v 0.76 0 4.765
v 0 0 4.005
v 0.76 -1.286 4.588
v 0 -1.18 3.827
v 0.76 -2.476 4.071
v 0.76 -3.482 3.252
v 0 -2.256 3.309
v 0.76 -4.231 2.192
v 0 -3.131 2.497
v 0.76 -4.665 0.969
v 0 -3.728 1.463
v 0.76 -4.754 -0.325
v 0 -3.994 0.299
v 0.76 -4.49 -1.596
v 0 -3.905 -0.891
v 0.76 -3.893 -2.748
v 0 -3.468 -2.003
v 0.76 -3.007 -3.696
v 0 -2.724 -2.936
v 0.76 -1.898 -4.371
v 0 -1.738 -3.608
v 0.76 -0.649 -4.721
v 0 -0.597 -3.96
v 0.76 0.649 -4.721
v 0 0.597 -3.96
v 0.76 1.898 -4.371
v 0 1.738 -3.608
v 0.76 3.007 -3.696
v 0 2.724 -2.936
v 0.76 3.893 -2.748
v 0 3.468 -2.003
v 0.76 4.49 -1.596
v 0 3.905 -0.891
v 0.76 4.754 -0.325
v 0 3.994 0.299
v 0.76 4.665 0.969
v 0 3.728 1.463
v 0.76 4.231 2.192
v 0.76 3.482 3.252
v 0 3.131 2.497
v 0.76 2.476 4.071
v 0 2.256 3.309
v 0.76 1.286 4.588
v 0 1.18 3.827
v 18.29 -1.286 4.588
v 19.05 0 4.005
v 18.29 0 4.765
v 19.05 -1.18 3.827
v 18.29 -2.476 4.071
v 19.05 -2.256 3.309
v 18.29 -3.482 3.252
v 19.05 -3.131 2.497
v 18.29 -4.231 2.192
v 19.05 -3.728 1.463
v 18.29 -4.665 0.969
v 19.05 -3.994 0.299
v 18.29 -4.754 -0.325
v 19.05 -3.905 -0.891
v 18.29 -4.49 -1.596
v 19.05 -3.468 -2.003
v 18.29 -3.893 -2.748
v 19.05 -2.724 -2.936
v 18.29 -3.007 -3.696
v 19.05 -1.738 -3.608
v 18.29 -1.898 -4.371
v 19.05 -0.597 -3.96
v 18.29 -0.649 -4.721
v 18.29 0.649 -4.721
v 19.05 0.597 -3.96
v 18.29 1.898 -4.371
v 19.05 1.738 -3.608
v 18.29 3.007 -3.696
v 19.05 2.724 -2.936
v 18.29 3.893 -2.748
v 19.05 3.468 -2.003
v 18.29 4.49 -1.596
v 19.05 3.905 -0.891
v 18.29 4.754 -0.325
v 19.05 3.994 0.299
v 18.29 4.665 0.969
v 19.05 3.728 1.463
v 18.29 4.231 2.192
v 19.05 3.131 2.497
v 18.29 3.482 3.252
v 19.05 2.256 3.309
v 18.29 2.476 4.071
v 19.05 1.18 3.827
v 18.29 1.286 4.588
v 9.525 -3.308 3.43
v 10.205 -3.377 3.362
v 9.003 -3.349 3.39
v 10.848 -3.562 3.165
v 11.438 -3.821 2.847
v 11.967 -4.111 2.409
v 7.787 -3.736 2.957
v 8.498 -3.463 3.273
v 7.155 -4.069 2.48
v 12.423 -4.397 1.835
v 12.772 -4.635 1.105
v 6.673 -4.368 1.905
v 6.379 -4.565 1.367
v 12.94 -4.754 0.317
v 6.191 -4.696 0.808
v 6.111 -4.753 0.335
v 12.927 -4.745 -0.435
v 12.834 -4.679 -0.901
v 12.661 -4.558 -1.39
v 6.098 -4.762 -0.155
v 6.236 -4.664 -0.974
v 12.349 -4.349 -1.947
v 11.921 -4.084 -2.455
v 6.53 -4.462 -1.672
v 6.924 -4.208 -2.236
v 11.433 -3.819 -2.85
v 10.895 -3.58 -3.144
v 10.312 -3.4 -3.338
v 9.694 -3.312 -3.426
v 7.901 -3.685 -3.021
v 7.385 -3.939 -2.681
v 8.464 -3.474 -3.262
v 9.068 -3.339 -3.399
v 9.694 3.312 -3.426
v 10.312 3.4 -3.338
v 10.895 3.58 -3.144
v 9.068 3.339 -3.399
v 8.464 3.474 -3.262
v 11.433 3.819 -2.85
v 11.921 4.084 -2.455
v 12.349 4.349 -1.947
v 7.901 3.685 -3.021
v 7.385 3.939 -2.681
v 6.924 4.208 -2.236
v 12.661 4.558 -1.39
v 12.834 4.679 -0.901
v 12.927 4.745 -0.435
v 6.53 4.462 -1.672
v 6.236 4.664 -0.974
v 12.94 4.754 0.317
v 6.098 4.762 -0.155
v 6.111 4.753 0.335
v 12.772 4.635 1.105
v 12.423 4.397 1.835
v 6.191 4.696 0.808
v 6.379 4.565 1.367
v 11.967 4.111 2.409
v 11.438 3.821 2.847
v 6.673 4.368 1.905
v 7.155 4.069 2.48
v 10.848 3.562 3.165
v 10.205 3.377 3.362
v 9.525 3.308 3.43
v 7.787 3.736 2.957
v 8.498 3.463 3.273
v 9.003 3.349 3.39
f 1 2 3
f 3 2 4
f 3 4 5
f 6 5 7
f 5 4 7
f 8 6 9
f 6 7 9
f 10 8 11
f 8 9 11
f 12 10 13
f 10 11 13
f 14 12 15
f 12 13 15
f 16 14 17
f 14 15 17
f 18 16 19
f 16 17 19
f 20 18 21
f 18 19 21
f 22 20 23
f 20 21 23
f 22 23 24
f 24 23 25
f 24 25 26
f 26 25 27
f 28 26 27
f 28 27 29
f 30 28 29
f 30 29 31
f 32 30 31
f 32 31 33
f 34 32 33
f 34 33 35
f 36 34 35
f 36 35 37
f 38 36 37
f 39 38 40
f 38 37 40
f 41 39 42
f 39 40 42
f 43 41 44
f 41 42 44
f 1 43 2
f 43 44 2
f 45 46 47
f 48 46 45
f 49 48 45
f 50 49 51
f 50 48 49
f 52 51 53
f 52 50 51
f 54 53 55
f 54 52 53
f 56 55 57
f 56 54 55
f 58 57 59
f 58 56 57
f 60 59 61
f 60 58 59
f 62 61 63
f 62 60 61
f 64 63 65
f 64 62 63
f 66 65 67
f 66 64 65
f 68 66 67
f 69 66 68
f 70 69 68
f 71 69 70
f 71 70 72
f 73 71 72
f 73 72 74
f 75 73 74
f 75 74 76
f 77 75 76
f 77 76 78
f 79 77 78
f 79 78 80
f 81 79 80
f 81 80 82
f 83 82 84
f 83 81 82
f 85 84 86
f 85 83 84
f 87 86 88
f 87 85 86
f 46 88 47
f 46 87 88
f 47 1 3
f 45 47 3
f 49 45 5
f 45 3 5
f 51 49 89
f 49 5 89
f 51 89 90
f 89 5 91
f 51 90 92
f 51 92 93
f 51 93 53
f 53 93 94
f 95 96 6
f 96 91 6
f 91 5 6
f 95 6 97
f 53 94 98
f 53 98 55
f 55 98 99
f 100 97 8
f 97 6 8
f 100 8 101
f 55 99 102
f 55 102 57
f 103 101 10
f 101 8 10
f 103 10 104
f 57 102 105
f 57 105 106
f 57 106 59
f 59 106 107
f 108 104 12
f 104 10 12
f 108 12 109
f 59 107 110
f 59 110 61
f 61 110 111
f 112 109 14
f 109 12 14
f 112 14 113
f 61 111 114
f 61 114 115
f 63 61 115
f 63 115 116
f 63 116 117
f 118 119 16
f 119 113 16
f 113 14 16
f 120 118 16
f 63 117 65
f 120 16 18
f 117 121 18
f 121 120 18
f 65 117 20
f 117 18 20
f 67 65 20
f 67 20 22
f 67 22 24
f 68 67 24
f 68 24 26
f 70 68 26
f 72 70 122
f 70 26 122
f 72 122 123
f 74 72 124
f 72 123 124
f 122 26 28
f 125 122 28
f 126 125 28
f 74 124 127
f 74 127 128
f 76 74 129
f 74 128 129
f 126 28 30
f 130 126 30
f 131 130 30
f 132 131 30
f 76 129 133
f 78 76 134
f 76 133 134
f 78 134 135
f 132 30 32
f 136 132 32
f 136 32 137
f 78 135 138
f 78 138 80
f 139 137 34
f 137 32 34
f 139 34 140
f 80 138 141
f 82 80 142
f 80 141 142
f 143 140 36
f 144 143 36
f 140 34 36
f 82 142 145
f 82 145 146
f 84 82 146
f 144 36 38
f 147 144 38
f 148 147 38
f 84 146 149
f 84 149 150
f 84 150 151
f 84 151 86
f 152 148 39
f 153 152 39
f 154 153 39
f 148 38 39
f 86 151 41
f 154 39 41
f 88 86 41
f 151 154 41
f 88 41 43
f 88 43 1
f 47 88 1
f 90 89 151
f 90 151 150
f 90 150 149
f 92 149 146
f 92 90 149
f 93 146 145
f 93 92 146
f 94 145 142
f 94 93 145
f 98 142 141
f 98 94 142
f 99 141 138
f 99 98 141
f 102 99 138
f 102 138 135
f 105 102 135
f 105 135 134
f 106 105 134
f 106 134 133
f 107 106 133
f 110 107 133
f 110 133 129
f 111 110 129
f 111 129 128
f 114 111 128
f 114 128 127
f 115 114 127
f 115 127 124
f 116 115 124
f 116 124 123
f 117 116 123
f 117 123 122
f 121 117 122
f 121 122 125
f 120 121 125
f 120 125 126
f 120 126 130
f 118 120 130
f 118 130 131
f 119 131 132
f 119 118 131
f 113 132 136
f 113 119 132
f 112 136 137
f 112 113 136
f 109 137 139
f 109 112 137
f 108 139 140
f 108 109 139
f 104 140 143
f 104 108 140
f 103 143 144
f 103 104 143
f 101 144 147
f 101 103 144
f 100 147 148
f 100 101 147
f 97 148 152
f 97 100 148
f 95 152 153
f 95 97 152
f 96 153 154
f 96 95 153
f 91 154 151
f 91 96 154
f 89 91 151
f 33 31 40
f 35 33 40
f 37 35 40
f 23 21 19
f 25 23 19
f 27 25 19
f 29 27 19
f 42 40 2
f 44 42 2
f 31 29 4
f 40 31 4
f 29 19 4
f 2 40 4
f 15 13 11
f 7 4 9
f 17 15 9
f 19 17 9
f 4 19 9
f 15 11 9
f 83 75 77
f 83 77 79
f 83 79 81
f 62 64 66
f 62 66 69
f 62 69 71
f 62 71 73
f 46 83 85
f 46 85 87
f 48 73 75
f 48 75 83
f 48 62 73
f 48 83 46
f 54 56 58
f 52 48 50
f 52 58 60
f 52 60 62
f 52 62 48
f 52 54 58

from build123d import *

# Parameters (mm, degrees)
SKETCH1_R               = 4.765
BOSS_EXTRUDE1_DEPTH     = 19.05
CHAMFER1_SIZE           = 0.76
CUT_EXTRUDE1_DEPTH      = 21.206755059
CUT_EXTRUDE1_DEPTH_BACK = 21.206755059
SKETCH2_R               = 3.43


with BuildPart() as part:
    # Sketch1 → Boss-Extrude1 (new body)
    with BuildSketch(Plane(origin=(0, 0, 0), x_dir=(0, 0, -1), z_dir=(1, 0, 0))):
        with Locations(Location((0, 0, 0), (0, 0, 180))):
            Circle(SKETCH1_R)
    extrude(amount=BOSS_EXTRUDE1_DEPTH)

    # Chamfer1
    chamfer1_edges = [part.edges().sort_by_distance(p)[0] for p in [
        (0, 0, -4.765),
        (19.05, 0, -4.765),
    ]]
    chamfer(chamfer1_edges, length=CHAMFER1_SIZE)

    # Sketch2 → Cut-Extrude1 (cut, two sides: drawn at the far end of the back side and taken through both)
    with BuildSketch(Plane(origin=(0, 0, 0), x_dir=(1, 0, 0), z_dir=(0, 1, 0)).offset(-CUT_EXTRUDE1_DEPTH_BACK)):
        with Locations(Location((9.525, 0, 0), (0, 0, 270))):
            Circle(SKETCH2_R)
    extrude(amount=CUT_EXTRUDE1_DEPTH + CUT_EXTRUDE1_DEPTH_BACK, mode=Mode.SUBTRACT)


solid = part.part
